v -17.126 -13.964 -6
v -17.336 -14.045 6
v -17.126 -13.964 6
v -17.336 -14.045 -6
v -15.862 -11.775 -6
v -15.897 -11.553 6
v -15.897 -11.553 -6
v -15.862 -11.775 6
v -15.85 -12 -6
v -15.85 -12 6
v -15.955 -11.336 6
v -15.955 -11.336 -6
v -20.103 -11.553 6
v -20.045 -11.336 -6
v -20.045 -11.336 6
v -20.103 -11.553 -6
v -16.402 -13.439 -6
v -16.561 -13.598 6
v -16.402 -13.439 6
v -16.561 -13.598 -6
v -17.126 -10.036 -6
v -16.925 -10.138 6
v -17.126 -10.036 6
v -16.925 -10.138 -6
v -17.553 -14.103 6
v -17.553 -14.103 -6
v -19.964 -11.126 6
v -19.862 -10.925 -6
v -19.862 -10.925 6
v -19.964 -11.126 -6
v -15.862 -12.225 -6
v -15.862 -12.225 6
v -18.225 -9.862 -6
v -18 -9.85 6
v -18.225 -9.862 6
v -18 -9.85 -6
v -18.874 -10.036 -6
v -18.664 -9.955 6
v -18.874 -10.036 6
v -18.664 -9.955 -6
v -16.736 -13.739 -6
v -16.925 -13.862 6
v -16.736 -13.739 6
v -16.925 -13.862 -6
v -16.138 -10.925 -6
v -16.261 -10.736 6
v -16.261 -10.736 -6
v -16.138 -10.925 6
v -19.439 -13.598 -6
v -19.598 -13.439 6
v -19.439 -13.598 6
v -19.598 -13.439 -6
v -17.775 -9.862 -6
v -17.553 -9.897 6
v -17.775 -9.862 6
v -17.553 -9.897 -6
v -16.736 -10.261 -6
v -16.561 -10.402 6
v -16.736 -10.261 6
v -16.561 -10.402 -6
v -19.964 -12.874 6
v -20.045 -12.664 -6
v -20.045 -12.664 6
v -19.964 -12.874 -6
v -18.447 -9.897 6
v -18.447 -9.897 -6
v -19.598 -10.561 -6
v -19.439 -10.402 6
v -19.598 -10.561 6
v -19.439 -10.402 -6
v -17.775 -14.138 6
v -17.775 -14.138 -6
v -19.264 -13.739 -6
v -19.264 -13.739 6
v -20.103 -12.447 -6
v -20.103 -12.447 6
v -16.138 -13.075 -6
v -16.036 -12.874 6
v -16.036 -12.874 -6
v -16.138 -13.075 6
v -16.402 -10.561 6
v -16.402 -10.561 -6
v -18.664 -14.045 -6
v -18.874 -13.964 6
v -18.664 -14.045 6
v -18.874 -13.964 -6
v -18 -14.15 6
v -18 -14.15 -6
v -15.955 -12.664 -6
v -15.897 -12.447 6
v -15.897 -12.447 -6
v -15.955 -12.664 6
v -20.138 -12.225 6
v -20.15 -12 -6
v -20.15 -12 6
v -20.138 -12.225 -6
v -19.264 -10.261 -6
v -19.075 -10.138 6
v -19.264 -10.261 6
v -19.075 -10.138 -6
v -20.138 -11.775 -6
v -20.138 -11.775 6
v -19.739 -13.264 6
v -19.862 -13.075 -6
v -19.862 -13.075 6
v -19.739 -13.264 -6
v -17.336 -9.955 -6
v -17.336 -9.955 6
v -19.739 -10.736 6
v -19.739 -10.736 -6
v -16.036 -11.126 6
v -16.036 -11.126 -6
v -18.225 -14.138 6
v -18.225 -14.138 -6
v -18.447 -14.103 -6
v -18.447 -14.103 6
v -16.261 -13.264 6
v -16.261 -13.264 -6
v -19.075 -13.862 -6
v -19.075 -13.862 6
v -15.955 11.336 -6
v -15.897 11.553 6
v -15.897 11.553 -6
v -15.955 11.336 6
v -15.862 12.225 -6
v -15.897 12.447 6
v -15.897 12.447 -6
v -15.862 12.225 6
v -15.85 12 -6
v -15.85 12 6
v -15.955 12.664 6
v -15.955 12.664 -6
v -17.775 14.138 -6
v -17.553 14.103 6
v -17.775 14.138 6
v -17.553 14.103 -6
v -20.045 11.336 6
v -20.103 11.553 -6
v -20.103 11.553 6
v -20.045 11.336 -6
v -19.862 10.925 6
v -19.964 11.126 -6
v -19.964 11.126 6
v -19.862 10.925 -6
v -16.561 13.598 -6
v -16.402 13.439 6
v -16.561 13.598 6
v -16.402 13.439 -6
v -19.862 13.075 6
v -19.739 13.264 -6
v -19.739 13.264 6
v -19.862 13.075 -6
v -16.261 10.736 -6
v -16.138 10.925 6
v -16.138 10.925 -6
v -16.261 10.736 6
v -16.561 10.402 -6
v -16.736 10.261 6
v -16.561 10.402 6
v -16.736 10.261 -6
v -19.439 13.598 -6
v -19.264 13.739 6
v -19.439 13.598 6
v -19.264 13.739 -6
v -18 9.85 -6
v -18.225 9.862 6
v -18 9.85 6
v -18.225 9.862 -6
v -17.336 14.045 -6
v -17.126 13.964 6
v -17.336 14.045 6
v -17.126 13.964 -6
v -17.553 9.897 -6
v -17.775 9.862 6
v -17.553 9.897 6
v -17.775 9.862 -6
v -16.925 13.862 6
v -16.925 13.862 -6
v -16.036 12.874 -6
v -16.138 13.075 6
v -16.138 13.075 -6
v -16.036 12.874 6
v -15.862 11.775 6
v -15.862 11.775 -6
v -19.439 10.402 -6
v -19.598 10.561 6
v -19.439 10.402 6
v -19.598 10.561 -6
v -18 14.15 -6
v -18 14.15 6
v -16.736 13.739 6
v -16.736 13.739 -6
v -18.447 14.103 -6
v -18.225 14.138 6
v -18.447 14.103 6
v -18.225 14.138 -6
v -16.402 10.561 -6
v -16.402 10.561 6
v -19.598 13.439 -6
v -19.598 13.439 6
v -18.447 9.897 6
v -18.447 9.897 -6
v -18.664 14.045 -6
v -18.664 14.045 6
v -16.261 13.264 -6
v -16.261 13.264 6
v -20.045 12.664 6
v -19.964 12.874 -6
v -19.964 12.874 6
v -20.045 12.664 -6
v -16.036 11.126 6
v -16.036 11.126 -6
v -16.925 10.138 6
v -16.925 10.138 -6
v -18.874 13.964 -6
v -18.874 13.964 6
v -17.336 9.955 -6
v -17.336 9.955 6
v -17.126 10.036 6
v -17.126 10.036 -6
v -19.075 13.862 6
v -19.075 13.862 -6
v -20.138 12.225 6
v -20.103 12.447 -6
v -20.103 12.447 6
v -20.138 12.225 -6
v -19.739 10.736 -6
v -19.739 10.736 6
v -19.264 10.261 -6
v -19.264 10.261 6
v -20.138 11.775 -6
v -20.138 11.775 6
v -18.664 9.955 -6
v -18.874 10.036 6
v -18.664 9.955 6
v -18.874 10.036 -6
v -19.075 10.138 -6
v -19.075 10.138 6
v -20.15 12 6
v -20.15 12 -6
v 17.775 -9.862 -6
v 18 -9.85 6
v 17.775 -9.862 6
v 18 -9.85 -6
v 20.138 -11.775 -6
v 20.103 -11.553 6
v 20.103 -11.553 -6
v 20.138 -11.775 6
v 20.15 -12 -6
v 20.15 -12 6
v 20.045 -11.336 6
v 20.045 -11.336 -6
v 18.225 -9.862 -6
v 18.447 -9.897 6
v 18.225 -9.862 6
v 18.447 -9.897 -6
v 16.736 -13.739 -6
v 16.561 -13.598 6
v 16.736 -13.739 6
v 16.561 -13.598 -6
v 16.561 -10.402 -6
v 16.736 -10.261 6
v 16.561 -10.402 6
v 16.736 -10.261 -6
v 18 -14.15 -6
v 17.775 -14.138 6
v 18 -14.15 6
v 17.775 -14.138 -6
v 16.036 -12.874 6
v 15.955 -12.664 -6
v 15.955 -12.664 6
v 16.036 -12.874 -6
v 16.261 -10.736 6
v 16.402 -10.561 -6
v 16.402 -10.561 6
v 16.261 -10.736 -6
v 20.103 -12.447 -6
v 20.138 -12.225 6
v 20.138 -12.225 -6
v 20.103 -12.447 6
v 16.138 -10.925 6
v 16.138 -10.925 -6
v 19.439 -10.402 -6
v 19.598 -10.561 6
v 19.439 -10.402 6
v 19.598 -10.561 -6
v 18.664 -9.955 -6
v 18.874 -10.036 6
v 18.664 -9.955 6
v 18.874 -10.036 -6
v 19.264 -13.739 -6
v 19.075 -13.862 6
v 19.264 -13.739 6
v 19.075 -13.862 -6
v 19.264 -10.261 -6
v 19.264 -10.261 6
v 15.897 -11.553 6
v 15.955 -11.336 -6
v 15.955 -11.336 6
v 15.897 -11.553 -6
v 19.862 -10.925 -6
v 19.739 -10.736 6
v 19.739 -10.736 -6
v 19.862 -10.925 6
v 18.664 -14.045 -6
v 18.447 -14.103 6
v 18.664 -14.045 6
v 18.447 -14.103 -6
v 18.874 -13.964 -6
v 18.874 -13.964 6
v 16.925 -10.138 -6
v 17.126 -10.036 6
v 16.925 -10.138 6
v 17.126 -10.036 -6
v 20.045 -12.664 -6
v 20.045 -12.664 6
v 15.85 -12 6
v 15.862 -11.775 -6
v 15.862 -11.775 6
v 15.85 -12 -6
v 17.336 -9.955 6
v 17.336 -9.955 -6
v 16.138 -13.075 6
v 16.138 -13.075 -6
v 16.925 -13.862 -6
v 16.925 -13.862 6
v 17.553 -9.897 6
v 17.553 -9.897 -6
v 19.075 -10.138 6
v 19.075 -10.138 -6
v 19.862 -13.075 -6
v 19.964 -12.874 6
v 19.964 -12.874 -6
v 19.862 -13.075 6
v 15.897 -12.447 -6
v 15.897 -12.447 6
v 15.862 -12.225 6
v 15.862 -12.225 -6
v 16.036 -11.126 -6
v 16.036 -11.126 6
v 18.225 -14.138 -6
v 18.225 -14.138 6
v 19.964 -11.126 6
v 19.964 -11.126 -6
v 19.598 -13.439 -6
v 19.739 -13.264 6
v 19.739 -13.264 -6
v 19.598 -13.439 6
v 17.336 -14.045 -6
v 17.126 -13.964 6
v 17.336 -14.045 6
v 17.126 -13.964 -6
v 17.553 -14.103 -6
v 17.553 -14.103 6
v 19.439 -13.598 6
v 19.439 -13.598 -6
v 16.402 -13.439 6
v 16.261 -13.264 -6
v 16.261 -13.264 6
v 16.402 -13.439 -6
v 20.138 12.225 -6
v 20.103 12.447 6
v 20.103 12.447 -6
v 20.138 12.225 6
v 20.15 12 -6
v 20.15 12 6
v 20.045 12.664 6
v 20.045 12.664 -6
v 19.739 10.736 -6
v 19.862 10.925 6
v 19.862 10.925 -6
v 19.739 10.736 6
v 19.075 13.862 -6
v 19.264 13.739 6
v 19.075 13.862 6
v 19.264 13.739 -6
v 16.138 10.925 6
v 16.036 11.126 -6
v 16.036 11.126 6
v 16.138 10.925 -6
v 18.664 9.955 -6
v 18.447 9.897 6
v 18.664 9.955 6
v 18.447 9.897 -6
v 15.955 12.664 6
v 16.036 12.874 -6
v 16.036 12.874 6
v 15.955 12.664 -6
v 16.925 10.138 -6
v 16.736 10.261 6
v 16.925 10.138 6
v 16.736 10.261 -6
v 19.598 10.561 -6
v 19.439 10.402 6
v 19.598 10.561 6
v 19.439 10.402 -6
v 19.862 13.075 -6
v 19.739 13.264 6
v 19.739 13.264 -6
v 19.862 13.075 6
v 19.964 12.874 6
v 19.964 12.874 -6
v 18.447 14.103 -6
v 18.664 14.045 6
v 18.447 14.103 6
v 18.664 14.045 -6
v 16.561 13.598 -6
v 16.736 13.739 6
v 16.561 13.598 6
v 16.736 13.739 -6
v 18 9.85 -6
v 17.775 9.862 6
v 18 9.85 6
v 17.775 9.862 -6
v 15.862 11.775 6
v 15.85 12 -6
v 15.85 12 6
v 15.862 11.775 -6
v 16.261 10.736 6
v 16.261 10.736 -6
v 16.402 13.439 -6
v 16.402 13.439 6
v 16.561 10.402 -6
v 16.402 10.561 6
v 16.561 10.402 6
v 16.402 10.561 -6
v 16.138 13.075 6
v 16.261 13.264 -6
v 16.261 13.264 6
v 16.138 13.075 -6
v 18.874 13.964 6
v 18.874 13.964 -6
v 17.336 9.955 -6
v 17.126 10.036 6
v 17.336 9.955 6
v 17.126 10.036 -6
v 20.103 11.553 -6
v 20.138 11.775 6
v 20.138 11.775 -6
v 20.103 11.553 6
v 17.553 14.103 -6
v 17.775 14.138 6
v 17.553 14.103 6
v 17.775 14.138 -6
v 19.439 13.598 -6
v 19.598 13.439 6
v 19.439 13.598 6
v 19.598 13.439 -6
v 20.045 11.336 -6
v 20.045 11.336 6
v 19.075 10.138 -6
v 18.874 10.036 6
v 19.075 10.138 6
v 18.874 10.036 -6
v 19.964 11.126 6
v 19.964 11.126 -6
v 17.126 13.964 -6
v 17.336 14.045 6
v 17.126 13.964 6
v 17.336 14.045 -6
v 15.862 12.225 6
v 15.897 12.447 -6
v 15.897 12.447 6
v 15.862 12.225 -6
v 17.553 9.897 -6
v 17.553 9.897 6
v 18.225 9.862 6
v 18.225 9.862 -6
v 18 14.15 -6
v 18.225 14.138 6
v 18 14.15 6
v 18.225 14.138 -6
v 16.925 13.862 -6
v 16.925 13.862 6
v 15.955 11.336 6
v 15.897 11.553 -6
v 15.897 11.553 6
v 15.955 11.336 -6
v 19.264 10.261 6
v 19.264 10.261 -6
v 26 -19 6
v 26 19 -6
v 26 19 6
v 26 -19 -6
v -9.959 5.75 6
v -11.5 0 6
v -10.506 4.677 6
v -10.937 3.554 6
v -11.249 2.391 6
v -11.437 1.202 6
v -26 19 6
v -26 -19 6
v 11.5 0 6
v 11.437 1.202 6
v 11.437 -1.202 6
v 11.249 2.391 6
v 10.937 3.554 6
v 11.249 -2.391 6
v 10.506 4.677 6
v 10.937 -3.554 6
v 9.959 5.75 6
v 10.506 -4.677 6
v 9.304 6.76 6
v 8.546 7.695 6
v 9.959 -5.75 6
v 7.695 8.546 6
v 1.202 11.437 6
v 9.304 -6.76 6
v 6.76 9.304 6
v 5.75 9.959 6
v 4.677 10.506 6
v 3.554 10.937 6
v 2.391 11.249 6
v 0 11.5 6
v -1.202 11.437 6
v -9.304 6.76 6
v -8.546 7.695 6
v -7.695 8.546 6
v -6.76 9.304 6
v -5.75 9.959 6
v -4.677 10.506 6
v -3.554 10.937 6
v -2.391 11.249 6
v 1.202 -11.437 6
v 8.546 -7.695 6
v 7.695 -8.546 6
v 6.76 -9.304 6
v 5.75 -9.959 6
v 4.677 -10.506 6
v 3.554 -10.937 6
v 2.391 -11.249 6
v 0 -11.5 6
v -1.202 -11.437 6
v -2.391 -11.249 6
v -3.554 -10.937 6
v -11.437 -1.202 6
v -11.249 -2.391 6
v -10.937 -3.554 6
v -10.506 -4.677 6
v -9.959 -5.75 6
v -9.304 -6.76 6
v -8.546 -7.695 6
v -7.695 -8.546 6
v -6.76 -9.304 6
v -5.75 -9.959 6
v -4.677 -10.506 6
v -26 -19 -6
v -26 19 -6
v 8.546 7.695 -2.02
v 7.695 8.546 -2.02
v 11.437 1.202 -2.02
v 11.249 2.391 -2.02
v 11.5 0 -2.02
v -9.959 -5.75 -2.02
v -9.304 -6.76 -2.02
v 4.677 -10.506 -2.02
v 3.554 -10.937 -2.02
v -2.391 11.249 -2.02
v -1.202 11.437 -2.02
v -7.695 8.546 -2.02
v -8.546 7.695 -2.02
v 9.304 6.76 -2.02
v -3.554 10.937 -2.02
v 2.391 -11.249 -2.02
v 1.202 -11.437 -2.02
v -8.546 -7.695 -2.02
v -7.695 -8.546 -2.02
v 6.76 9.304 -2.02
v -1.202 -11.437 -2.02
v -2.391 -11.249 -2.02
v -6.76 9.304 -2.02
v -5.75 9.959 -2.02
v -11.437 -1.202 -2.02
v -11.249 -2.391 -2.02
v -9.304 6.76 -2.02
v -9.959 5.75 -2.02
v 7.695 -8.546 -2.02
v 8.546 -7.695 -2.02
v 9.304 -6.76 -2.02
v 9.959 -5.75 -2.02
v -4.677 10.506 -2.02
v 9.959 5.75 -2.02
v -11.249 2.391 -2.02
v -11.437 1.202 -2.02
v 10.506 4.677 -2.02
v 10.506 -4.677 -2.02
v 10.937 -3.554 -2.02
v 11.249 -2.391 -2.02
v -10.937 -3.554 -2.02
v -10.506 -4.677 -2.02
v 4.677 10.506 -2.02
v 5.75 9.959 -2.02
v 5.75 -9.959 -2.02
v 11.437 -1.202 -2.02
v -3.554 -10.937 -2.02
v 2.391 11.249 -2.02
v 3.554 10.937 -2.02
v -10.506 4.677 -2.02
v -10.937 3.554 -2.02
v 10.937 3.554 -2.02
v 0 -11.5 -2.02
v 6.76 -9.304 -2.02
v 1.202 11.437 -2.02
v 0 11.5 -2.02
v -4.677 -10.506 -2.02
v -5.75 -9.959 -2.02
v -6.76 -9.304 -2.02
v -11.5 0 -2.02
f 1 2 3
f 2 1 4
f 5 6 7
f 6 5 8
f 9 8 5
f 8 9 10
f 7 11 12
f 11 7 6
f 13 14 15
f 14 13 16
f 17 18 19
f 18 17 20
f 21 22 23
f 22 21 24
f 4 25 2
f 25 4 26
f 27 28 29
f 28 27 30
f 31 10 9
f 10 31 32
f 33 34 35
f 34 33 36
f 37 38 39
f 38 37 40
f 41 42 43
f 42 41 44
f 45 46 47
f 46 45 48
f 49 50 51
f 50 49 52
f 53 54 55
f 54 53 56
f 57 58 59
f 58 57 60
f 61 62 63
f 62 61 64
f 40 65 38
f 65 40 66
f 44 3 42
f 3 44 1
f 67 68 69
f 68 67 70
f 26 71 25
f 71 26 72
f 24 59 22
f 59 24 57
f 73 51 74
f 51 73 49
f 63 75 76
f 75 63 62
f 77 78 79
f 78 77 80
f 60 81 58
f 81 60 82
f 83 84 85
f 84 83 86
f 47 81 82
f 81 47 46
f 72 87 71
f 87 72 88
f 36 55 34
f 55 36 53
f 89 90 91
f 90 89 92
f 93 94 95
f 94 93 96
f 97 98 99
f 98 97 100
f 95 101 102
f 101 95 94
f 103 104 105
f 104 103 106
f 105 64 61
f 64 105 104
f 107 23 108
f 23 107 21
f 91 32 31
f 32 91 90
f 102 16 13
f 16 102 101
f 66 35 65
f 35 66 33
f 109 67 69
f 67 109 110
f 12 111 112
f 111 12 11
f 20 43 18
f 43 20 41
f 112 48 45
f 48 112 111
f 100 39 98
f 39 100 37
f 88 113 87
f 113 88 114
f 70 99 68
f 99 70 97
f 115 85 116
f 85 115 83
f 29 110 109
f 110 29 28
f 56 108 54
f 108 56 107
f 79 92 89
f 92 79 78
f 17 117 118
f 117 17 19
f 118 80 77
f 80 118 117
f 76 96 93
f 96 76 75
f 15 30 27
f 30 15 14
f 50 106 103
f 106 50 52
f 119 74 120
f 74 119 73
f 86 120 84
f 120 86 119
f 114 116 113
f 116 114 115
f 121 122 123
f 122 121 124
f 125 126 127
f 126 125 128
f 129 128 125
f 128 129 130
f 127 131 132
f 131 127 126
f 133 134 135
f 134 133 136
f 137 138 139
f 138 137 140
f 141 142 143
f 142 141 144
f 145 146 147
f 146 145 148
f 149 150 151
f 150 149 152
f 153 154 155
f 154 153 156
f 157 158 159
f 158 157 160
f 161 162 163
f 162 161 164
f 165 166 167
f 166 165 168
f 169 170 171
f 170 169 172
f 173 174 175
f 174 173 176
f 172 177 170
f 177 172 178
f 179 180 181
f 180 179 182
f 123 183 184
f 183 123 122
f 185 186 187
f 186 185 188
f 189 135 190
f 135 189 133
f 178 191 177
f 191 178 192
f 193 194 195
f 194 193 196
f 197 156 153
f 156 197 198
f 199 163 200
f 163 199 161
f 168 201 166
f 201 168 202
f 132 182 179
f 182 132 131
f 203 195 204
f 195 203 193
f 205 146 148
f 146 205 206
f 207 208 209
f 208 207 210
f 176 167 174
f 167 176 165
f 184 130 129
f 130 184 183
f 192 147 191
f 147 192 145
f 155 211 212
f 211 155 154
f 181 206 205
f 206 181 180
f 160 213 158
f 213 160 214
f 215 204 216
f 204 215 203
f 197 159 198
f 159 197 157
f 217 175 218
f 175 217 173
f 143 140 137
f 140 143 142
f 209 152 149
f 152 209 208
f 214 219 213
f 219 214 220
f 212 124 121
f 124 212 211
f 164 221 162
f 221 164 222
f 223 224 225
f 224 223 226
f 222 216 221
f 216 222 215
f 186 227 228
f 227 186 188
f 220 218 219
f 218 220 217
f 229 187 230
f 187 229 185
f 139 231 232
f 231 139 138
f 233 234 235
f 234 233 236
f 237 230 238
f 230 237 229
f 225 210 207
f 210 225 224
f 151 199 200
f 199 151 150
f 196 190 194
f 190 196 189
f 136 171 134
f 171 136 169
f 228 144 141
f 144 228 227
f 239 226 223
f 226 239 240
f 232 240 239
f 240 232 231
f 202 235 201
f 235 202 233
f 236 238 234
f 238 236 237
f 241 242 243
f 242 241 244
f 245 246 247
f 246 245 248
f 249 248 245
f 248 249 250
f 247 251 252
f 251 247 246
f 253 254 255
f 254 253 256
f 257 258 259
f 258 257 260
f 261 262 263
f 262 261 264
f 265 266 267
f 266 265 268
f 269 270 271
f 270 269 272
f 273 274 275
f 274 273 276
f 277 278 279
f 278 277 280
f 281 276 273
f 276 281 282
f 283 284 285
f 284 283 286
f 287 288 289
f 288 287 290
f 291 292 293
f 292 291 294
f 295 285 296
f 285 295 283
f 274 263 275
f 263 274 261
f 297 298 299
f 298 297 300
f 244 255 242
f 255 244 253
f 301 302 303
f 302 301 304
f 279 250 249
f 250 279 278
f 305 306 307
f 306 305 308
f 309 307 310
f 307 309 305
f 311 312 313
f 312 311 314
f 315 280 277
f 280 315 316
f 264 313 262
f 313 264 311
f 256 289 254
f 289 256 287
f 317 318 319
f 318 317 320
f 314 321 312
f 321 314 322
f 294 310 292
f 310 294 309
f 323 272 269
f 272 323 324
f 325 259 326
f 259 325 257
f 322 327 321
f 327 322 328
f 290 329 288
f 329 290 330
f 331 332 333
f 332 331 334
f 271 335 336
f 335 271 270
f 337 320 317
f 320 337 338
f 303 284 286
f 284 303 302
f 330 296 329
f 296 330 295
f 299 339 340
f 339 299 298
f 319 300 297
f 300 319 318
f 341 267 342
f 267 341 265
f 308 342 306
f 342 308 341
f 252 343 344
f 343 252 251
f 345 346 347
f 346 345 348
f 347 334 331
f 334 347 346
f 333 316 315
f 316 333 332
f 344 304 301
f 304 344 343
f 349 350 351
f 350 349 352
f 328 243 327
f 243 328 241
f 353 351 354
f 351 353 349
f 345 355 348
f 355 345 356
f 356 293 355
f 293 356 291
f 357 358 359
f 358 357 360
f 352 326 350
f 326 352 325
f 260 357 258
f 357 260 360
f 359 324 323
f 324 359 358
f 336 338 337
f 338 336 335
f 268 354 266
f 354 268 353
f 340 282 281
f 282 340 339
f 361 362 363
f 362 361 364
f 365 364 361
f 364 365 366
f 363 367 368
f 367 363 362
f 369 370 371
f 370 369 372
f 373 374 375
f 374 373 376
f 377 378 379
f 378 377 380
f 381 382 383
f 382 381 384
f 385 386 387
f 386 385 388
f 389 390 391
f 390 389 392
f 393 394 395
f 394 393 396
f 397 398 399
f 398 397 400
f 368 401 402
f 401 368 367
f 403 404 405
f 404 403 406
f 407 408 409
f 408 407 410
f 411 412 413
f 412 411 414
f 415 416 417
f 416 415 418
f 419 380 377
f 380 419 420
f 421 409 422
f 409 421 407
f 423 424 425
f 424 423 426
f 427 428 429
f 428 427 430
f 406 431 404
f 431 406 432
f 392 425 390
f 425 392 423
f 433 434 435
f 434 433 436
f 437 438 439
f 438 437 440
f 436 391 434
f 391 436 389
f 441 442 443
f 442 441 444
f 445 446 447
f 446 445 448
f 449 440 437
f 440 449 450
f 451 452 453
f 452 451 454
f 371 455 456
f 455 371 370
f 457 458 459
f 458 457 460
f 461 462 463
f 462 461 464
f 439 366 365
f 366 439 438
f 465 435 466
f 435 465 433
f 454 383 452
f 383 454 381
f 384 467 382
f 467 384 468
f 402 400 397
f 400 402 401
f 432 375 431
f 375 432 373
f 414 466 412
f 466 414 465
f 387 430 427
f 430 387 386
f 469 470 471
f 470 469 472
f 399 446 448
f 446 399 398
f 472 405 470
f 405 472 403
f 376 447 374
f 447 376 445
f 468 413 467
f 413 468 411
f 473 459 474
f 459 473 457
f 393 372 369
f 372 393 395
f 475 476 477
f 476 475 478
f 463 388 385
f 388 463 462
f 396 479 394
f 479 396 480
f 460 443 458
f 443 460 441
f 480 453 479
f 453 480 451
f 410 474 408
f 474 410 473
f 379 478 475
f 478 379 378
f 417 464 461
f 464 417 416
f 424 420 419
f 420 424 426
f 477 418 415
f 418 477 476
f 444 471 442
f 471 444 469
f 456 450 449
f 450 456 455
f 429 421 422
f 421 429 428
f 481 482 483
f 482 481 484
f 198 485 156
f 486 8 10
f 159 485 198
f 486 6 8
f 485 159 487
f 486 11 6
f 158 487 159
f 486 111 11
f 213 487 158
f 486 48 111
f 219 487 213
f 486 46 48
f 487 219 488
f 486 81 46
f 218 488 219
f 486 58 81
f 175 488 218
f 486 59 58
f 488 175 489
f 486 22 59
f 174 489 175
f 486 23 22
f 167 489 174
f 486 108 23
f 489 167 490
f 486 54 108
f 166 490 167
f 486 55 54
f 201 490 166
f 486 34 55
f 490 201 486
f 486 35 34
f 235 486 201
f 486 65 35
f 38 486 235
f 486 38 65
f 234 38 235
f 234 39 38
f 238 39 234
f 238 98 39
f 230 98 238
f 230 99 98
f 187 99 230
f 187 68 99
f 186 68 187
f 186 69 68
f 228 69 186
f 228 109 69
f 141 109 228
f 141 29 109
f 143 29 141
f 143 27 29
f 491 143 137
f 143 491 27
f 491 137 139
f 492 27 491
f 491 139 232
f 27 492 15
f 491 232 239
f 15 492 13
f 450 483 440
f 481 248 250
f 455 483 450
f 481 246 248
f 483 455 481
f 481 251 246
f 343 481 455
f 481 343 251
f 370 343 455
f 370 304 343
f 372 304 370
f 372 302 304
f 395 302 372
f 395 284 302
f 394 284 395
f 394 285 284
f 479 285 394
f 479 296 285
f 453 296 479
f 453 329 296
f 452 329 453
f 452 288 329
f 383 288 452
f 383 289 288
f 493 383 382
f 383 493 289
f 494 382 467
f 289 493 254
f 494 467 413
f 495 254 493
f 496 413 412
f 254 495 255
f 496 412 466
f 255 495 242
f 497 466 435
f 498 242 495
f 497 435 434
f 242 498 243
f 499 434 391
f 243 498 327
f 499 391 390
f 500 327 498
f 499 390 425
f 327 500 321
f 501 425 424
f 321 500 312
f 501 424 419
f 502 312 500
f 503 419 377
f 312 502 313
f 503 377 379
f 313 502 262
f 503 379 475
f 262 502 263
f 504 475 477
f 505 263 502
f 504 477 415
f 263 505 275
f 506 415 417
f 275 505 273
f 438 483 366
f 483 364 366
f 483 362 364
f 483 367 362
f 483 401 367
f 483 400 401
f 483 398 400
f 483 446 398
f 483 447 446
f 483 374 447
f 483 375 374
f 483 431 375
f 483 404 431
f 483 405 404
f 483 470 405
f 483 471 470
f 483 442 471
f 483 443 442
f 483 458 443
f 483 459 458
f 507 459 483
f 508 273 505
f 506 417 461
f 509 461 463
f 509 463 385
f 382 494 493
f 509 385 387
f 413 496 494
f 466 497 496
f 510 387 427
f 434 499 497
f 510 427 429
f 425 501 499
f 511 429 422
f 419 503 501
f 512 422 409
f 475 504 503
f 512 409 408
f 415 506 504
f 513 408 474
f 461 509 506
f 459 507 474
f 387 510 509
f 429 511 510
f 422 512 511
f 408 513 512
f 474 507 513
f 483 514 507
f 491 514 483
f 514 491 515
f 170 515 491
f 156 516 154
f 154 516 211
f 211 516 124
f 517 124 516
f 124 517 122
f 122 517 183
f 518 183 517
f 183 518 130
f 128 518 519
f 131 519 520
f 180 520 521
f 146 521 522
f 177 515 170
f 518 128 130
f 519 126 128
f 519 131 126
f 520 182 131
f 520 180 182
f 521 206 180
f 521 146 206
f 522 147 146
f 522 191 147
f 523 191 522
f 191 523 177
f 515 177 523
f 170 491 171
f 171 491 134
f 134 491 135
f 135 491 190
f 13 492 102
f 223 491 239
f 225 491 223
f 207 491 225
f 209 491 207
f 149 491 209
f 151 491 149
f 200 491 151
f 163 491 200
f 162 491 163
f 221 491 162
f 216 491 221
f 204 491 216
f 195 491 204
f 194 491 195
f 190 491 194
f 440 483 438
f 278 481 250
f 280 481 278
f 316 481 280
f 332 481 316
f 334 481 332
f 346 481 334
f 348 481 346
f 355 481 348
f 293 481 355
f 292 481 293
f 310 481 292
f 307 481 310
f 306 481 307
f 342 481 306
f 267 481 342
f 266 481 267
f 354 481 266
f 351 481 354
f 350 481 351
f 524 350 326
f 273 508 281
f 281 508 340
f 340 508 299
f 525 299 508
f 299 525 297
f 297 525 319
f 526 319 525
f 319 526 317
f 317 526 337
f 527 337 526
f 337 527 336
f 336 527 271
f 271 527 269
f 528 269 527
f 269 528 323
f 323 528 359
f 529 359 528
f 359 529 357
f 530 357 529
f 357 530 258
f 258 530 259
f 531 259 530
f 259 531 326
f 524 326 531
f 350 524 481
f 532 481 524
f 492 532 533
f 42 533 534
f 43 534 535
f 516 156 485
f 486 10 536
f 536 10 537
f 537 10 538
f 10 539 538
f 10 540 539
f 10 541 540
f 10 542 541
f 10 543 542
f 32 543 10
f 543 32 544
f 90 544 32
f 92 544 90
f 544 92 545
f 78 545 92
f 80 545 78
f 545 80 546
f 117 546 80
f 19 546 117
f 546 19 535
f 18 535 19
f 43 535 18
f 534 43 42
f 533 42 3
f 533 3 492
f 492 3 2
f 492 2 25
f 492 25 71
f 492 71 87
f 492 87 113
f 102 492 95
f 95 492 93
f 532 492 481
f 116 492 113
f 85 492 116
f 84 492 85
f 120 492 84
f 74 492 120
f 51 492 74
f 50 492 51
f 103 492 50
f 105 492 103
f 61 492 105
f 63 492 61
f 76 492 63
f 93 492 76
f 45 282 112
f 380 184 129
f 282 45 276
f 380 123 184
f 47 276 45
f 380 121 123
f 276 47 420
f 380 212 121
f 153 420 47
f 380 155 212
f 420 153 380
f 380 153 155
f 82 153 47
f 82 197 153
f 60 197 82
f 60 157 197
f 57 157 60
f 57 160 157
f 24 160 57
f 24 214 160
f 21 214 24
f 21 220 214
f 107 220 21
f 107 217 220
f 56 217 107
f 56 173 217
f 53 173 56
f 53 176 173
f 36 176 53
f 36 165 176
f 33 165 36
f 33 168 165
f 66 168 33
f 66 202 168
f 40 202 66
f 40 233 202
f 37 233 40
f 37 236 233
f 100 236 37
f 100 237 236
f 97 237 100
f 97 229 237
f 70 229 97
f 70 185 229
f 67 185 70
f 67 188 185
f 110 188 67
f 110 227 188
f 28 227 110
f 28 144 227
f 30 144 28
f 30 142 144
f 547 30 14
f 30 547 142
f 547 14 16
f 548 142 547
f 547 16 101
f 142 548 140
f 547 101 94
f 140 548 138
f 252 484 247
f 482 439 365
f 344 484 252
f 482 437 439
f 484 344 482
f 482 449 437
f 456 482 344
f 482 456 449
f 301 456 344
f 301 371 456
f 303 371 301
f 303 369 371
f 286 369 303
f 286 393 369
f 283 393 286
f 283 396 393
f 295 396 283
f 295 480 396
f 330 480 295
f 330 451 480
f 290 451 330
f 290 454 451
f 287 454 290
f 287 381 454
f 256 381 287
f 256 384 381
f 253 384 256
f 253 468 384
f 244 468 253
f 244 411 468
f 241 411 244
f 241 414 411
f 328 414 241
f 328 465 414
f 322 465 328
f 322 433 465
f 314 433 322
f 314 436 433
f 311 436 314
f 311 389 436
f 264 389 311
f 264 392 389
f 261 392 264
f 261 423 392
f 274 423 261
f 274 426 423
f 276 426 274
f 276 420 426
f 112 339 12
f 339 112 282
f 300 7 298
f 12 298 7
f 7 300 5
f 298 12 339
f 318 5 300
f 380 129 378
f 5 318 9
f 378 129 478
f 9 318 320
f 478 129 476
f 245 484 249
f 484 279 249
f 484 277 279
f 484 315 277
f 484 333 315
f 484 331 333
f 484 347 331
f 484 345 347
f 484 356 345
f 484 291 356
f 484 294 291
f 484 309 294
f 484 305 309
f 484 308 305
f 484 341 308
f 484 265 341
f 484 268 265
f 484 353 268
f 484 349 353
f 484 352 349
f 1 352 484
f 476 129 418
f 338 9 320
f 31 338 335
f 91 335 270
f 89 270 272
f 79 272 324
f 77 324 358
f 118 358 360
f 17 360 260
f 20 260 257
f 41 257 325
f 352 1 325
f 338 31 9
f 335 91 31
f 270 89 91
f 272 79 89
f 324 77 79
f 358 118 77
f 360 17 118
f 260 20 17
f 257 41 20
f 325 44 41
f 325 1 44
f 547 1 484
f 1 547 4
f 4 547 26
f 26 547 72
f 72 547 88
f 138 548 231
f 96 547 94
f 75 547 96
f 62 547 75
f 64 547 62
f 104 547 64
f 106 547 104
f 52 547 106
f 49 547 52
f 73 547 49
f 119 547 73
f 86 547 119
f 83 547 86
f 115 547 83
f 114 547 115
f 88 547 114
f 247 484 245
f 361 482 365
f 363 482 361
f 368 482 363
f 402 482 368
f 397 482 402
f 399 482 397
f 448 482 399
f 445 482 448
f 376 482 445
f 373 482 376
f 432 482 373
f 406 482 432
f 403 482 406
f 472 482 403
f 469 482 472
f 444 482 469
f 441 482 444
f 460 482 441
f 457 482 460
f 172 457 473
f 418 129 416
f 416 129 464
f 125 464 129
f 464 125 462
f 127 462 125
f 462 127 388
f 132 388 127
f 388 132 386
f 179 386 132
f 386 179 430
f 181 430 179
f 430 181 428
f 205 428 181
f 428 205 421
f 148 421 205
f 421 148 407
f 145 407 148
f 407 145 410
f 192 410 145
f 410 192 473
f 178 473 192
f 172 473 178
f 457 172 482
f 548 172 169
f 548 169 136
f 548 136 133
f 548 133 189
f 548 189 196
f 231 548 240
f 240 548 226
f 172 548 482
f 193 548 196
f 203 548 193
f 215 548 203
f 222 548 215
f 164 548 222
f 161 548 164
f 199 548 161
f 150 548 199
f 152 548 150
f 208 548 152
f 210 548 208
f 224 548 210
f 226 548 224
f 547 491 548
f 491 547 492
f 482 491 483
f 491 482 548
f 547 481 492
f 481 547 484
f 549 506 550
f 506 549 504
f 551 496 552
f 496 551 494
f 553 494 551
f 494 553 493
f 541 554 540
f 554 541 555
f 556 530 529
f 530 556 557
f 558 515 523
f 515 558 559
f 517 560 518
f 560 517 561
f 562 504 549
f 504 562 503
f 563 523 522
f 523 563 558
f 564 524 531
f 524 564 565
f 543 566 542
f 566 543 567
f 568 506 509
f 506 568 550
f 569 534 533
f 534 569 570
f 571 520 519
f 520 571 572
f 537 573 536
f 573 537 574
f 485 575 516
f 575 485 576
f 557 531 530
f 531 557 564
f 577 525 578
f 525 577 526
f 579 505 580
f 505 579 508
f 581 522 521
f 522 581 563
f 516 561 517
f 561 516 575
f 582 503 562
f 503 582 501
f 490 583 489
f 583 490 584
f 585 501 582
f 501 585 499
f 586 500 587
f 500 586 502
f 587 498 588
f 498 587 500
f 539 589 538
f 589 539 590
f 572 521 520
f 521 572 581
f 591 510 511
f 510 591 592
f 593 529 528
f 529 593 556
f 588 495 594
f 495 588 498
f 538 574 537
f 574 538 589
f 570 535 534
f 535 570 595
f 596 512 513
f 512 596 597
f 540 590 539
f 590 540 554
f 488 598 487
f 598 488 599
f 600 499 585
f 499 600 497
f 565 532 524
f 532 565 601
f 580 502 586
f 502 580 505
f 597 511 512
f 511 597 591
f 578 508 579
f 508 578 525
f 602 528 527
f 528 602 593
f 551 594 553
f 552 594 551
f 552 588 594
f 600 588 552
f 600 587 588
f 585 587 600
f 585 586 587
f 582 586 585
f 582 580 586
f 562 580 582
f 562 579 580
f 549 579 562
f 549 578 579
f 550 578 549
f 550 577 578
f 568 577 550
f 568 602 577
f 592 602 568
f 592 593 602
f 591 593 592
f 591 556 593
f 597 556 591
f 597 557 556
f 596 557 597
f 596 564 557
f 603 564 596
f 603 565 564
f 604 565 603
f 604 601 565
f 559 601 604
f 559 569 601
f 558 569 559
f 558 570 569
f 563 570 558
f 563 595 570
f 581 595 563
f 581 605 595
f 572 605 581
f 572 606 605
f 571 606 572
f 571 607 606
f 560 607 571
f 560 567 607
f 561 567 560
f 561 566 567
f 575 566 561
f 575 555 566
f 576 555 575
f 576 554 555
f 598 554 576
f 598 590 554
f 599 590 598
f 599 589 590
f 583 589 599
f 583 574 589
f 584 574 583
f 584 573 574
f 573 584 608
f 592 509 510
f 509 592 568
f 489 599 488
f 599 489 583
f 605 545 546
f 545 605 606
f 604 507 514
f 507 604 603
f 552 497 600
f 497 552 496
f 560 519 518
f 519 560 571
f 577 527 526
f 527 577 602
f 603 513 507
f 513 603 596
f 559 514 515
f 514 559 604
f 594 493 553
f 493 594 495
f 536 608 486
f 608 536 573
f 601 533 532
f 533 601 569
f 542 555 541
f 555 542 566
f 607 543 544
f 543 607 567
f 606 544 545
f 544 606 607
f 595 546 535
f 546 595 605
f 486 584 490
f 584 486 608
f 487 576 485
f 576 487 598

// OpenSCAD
// T8 lead-screw nut holder: T8 lead-screw nut holder with a deep but non-through pocket.
$fn = 60;
eps = 0.02;
body_l = 52;
body_w = 38;
body_t = 12;
nut_pocket_d = 23;
nut_pocket_depth = 8;
mount_pitch = 36;
mount_d = 4.3;

module mount_hole(x, y) {
    translate([x, y, -body_t / 2 - eps]) cylinder(d = mount_d, h = body_t + 2 * eps);
}

difference() {
    cube([body_l, body_w, body_t], center = true);
    translate([0, 0, body_t / 2 - nut_pocket_depth - eps])
        cylinder(d = nut_pocket_d, h = nut_pocket_depth + 2 * eps);
    for (x = [-mount_pitch / 2, mount_pitch / 2], y = [-12, 12]) mount_hole(x, y);
}
